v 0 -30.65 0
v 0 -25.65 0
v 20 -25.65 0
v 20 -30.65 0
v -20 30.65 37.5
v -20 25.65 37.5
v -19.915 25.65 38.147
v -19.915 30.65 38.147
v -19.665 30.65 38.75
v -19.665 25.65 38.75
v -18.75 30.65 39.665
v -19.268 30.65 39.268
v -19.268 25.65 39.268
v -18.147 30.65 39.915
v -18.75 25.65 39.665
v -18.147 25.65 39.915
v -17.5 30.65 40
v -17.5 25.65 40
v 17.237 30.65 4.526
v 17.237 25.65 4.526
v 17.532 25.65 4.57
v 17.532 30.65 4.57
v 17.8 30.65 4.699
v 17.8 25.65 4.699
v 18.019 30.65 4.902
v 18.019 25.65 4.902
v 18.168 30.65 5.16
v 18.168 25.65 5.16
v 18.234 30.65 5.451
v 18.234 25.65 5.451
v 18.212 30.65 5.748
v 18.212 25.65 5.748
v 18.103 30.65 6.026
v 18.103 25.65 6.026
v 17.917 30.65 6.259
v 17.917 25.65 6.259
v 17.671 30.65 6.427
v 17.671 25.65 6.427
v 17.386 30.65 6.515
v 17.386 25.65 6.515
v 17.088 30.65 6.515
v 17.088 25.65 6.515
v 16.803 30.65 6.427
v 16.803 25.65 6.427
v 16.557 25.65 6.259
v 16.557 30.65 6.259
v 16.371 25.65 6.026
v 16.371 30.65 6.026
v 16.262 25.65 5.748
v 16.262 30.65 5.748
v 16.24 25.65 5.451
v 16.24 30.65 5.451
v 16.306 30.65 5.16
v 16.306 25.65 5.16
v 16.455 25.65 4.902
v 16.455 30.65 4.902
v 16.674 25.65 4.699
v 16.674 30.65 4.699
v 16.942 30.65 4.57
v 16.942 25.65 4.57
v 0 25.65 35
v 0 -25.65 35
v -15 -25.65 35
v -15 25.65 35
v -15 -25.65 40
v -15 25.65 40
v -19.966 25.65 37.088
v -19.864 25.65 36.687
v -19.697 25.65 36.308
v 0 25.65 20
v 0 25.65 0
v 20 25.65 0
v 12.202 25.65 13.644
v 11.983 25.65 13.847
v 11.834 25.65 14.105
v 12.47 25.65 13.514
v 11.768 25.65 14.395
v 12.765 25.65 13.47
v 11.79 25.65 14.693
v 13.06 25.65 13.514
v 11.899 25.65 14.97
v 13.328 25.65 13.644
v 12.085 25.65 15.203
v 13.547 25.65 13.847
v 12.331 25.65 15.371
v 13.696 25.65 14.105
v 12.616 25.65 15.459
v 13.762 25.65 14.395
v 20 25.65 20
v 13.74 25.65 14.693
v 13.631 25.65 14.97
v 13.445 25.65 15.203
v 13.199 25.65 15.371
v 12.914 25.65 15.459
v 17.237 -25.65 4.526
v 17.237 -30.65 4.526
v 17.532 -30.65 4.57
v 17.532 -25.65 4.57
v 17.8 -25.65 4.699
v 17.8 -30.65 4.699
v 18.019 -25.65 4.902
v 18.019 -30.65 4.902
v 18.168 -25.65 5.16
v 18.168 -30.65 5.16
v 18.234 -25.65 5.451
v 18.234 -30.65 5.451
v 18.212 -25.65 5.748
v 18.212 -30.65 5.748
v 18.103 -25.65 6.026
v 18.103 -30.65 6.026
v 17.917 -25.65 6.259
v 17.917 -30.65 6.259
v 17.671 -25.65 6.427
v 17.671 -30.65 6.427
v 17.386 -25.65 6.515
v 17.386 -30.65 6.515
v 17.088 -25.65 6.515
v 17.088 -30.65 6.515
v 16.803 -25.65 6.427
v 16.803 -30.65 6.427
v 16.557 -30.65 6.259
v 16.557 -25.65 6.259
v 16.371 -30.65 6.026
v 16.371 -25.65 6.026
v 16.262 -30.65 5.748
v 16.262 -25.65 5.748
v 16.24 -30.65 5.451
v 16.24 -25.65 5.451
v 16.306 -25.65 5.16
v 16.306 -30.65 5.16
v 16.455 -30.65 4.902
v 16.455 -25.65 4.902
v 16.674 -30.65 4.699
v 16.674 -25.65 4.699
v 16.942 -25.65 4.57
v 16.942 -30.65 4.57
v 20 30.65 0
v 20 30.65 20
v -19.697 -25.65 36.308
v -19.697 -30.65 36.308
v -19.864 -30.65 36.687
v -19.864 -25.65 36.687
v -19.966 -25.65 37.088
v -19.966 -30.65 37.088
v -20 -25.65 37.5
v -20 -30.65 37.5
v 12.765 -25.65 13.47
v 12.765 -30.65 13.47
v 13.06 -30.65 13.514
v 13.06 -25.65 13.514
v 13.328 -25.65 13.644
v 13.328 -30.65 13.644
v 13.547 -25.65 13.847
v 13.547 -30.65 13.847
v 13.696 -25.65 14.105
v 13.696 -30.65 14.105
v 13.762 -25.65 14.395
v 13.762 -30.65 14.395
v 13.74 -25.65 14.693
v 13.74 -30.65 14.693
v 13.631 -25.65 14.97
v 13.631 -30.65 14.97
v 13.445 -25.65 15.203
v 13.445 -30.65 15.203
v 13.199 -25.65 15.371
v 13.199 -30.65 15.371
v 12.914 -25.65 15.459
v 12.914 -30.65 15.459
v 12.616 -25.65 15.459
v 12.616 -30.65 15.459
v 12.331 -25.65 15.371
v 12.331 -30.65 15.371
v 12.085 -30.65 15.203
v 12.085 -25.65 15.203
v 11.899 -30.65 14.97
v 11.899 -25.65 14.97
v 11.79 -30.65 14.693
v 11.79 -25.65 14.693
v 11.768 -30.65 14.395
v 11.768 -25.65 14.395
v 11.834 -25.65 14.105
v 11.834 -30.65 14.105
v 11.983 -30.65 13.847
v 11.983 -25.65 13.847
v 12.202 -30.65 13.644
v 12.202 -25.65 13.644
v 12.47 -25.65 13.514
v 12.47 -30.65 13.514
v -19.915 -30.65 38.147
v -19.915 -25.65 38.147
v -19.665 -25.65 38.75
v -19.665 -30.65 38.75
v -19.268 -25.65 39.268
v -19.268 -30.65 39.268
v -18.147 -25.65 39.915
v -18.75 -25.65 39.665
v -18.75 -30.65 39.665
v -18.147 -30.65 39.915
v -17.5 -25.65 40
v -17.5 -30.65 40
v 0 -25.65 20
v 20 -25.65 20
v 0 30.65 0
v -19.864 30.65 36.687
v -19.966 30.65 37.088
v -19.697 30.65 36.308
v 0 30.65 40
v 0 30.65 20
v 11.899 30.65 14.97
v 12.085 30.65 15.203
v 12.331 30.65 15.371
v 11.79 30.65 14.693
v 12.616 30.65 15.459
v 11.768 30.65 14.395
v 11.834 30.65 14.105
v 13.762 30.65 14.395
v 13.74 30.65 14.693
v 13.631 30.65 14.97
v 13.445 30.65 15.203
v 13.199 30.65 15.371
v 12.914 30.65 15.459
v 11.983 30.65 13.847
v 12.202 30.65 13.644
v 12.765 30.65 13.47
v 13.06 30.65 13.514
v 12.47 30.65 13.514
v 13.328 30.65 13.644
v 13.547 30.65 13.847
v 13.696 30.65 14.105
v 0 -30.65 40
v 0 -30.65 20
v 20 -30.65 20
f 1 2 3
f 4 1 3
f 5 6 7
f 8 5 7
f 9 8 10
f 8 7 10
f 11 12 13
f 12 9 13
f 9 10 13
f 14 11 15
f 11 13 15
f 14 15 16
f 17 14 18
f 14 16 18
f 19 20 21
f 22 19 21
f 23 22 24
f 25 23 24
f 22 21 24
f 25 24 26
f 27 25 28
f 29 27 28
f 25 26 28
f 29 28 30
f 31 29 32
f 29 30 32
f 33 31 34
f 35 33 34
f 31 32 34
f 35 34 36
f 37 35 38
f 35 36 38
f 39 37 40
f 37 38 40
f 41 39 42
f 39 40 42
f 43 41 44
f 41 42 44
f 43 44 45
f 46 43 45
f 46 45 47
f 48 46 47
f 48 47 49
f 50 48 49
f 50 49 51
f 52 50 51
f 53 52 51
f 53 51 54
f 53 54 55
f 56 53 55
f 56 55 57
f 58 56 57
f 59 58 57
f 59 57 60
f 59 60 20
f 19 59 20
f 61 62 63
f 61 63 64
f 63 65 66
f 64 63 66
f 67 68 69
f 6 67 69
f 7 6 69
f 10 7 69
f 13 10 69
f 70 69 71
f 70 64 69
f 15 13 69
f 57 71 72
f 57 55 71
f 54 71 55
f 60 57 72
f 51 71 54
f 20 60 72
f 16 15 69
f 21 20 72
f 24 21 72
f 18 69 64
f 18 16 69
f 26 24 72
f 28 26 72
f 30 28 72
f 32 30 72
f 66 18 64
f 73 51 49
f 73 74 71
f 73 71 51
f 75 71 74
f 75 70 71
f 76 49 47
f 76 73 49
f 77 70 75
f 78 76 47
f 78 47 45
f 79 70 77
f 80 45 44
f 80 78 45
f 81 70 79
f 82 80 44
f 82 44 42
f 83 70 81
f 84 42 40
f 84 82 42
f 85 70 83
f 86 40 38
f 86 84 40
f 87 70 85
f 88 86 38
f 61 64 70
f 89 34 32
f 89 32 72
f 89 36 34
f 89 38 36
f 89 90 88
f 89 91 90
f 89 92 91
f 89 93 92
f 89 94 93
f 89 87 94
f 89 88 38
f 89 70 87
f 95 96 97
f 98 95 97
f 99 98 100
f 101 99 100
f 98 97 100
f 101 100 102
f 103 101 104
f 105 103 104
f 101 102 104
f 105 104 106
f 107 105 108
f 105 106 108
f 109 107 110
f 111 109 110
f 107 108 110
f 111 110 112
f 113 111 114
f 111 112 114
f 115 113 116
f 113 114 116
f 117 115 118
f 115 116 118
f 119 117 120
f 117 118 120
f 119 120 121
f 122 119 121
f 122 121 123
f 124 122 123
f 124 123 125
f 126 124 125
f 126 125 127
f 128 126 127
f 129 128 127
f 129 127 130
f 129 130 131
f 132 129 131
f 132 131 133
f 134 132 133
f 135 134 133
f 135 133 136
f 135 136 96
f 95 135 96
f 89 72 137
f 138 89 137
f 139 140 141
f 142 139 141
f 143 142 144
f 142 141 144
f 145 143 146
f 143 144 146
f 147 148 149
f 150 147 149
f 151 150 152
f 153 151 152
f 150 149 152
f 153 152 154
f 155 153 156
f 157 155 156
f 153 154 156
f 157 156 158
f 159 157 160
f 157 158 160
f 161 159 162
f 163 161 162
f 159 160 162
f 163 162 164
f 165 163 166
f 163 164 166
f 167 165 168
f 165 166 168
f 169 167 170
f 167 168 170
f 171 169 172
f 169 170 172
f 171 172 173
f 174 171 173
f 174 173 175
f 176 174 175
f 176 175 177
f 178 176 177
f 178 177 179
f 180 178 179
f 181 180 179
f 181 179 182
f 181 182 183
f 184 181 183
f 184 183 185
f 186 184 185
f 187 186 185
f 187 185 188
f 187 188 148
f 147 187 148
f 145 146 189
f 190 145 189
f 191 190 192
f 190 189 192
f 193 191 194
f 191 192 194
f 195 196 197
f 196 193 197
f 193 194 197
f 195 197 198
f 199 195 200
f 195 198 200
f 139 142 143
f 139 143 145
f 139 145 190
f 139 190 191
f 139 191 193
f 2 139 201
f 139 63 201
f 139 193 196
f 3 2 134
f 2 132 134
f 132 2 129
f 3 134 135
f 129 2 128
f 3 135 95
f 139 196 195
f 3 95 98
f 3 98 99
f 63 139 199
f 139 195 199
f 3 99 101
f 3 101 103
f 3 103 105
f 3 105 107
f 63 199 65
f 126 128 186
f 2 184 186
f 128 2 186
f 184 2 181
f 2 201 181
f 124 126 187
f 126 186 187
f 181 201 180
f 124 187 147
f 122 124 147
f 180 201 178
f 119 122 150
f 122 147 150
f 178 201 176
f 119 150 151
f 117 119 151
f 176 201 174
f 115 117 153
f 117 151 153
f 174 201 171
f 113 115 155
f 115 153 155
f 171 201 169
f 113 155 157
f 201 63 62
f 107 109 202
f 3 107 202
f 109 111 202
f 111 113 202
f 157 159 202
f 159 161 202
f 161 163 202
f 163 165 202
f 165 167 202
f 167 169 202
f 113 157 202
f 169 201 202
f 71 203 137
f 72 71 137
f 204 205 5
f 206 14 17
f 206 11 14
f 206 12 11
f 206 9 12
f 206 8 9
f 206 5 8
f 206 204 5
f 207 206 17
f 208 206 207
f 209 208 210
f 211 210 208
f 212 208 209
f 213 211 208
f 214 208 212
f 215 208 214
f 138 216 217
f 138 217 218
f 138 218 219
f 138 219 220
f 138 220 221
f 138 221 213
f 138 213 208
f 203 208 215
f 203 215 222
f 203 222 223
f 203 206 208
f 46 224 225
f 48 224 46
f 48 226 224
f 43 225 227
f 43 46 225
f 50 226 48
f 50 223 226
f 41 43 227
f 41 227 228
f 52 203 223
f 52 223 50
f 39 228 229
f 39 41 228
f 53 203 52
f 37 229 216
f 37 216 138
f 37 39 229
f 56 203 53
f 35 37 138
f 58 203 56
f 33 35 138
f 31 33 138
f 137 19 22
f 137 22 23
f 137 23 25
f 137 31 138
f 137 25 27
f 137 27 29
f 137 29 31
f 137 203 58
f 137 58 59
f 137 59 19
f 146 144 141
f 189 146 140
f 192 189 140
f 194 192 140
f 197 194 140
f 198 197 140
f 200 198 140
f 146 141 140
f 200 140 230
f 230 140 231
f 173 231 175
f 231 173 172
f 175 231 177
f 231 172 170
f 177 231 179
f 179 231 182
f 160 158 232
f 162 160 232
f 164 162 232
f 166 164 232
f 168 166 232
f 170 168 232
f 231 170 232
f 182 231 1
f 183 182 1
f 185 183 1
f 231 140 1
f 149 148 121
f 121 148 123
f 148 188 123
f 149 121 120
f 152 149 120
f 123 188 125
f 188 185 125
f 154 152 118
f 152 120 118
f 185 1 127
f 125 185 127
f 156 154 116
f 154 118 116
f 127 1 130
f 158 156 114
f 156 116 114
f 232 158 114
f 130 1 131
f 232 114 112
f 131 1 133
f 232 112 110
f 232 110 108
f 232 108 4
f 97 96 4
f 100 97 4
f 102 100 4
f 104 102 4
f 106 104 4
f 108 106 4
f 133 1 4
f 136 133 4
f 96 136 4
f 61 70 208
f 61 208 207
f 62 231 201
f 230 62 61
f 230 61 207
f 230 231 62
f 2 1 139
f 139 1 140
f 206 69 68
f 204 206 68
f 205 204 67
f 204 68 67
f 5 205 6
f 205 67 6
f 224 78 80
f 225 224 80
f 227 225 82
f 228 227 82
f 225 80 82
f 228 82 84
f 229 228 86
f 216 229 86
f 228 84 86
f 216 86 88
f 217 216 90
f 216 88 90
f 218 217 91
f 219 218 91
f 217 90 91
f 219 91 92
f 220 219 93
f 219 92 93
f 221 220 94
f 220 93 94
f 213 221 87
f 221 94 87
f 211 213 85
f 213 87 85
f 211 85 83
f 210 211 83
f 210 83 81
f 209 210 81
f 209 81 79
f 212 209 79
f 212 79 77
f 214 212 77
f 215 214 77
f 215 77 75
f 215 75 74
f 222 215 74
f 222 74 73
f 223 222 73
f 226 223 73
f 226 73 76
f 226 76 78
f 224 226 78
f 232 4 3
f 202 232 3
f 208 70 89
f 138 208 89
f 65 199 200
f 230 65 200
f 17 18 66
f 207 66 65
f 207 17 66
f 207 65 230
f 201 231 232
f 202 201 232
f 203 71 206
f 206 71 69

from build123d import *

# Parameters (mm, degrees)
SKETCH_1_W          = 40
SKETCH_1_H          = 61.3
EXTRUDE_1_DEPTH     = 40
SKETCH_2_W          = 20
SKETCH_2_H          = 51.3
CUT_EXTRUDE_1_DEPTH = 55.216441233
SKETCH_3_W          = 5
SKETCH_3_H          = 51.3
CUT_EXTRUDE_2_DEPTH = 55.216441233
SKETCH_4_W          = 35
SKETCH_4_H          = 51.3
CUT_EXTRUDE_3_DEPTH = 55.216441233
SKETCH_5_W          = 20
SKETCH_5_H          = 20
CUT_EXTRUDE_5_DEPTH = 76.879443857
SKETCH_6_R          = 1
CUT_EXTRUDE_6_DEPTH = 76.879443857


with BuildPart() as part:
    # 草图1 → 凸台-拉伸1 (new body)
    with BuildSketch(Plane.XY):
        Rectangle(SKETCH_1_W, SKETCH_1_H)
    extrude(amount=EXTRUDE_1_DEPTH)

    # 草图2 → 切除-拉伸1 (cut, through all)
    with BuildSketch(Plane.XY.offset(40)):
        with Locations((10, 0)):
            Rectangle(SKETCH_2_W, SKETCH_2_H)
    extrude(amount=-CUT_EXTRUDE_1_DEPTH, mode=Mode.SUBTRACT)

    # 草图3 → 切除-拉伸2 (cut, through all)
    with BuildSketch(Plane.XY.offset(40)):
        with Locations((-17.5, 0)):
            Rectangle(SKETCH_3_W, SKETCH_3_H)
    extrude(amount=-CUT_EXTRUDE_2_DEPTH, mode=Mode.SUBTRACT)

    # 草图4 → 切除-拉伸3 (cut, through all)
    with BuildSketch(Plane(origin=(0, 0, 0), x_dir=(0, 0, -1), z_dir=(1, 0, 0))):
        with Locations((-17.5, 0)):
            Rectangle(SKETCH_4_W, SKETCH_4_H)
    extrude(amount=-CUT_EXTRUDE_3_DEPTH, mode=Mode.SUBTRACT)

    # 草图5 → 切除-拉伸5 (cut, through all)
    with BuildSketch(Plane.XZ.offset(30.65)):
        with BuildLine():
            ThreePointArc((-19.697451431, 36.307856046), (-19.923182678, 36.885031943), (-20, 37.5))
            Line((-20, 37.5), (-20, 36.865536816))
            Line((-20, 36.865536816), (-19.697451431, 36.307856046))
        make_face()
        with BuildLine():
            ThreePointArc((-20, 37.5), (-19.267766953, 39.267766953), (-17.5, 40))
            Line((-17.5, 40), (-20, 40))
            Line((-20, 40), (-20, 37.5))
        make_face()
        Polygon((0, 0), (-19.697451431, 36.307856046), (-20, 36.865536816), (-20, 0), align=None)
        with Locations((10, 30)):
            Rectangle(SKETCH_5_W, SKETCH_5_H)
    extrude(amount=-CUT_EXTRUDE_5_DEPTH, mode=Mode.SUBTRACT)

    # 草图6 → 切除-拉伸6 (cut, through all)
    with BuildSketch(Plane.XZ.offset(30.65)):
        with Locations(Location((12.765, 14.47, 0), (0, 0, 270))):
            Circle(SKETCH_6_R)
        with Locations(Location((17.237135955, 5.52572809, 0), (0, 0, 270))):
            Circle(SKETCH_6_R)
    extrude(amount=-CUT_EXTRUDE_6_DEPTH, mode=Mode.SUBTRACT)


solid = part.part
